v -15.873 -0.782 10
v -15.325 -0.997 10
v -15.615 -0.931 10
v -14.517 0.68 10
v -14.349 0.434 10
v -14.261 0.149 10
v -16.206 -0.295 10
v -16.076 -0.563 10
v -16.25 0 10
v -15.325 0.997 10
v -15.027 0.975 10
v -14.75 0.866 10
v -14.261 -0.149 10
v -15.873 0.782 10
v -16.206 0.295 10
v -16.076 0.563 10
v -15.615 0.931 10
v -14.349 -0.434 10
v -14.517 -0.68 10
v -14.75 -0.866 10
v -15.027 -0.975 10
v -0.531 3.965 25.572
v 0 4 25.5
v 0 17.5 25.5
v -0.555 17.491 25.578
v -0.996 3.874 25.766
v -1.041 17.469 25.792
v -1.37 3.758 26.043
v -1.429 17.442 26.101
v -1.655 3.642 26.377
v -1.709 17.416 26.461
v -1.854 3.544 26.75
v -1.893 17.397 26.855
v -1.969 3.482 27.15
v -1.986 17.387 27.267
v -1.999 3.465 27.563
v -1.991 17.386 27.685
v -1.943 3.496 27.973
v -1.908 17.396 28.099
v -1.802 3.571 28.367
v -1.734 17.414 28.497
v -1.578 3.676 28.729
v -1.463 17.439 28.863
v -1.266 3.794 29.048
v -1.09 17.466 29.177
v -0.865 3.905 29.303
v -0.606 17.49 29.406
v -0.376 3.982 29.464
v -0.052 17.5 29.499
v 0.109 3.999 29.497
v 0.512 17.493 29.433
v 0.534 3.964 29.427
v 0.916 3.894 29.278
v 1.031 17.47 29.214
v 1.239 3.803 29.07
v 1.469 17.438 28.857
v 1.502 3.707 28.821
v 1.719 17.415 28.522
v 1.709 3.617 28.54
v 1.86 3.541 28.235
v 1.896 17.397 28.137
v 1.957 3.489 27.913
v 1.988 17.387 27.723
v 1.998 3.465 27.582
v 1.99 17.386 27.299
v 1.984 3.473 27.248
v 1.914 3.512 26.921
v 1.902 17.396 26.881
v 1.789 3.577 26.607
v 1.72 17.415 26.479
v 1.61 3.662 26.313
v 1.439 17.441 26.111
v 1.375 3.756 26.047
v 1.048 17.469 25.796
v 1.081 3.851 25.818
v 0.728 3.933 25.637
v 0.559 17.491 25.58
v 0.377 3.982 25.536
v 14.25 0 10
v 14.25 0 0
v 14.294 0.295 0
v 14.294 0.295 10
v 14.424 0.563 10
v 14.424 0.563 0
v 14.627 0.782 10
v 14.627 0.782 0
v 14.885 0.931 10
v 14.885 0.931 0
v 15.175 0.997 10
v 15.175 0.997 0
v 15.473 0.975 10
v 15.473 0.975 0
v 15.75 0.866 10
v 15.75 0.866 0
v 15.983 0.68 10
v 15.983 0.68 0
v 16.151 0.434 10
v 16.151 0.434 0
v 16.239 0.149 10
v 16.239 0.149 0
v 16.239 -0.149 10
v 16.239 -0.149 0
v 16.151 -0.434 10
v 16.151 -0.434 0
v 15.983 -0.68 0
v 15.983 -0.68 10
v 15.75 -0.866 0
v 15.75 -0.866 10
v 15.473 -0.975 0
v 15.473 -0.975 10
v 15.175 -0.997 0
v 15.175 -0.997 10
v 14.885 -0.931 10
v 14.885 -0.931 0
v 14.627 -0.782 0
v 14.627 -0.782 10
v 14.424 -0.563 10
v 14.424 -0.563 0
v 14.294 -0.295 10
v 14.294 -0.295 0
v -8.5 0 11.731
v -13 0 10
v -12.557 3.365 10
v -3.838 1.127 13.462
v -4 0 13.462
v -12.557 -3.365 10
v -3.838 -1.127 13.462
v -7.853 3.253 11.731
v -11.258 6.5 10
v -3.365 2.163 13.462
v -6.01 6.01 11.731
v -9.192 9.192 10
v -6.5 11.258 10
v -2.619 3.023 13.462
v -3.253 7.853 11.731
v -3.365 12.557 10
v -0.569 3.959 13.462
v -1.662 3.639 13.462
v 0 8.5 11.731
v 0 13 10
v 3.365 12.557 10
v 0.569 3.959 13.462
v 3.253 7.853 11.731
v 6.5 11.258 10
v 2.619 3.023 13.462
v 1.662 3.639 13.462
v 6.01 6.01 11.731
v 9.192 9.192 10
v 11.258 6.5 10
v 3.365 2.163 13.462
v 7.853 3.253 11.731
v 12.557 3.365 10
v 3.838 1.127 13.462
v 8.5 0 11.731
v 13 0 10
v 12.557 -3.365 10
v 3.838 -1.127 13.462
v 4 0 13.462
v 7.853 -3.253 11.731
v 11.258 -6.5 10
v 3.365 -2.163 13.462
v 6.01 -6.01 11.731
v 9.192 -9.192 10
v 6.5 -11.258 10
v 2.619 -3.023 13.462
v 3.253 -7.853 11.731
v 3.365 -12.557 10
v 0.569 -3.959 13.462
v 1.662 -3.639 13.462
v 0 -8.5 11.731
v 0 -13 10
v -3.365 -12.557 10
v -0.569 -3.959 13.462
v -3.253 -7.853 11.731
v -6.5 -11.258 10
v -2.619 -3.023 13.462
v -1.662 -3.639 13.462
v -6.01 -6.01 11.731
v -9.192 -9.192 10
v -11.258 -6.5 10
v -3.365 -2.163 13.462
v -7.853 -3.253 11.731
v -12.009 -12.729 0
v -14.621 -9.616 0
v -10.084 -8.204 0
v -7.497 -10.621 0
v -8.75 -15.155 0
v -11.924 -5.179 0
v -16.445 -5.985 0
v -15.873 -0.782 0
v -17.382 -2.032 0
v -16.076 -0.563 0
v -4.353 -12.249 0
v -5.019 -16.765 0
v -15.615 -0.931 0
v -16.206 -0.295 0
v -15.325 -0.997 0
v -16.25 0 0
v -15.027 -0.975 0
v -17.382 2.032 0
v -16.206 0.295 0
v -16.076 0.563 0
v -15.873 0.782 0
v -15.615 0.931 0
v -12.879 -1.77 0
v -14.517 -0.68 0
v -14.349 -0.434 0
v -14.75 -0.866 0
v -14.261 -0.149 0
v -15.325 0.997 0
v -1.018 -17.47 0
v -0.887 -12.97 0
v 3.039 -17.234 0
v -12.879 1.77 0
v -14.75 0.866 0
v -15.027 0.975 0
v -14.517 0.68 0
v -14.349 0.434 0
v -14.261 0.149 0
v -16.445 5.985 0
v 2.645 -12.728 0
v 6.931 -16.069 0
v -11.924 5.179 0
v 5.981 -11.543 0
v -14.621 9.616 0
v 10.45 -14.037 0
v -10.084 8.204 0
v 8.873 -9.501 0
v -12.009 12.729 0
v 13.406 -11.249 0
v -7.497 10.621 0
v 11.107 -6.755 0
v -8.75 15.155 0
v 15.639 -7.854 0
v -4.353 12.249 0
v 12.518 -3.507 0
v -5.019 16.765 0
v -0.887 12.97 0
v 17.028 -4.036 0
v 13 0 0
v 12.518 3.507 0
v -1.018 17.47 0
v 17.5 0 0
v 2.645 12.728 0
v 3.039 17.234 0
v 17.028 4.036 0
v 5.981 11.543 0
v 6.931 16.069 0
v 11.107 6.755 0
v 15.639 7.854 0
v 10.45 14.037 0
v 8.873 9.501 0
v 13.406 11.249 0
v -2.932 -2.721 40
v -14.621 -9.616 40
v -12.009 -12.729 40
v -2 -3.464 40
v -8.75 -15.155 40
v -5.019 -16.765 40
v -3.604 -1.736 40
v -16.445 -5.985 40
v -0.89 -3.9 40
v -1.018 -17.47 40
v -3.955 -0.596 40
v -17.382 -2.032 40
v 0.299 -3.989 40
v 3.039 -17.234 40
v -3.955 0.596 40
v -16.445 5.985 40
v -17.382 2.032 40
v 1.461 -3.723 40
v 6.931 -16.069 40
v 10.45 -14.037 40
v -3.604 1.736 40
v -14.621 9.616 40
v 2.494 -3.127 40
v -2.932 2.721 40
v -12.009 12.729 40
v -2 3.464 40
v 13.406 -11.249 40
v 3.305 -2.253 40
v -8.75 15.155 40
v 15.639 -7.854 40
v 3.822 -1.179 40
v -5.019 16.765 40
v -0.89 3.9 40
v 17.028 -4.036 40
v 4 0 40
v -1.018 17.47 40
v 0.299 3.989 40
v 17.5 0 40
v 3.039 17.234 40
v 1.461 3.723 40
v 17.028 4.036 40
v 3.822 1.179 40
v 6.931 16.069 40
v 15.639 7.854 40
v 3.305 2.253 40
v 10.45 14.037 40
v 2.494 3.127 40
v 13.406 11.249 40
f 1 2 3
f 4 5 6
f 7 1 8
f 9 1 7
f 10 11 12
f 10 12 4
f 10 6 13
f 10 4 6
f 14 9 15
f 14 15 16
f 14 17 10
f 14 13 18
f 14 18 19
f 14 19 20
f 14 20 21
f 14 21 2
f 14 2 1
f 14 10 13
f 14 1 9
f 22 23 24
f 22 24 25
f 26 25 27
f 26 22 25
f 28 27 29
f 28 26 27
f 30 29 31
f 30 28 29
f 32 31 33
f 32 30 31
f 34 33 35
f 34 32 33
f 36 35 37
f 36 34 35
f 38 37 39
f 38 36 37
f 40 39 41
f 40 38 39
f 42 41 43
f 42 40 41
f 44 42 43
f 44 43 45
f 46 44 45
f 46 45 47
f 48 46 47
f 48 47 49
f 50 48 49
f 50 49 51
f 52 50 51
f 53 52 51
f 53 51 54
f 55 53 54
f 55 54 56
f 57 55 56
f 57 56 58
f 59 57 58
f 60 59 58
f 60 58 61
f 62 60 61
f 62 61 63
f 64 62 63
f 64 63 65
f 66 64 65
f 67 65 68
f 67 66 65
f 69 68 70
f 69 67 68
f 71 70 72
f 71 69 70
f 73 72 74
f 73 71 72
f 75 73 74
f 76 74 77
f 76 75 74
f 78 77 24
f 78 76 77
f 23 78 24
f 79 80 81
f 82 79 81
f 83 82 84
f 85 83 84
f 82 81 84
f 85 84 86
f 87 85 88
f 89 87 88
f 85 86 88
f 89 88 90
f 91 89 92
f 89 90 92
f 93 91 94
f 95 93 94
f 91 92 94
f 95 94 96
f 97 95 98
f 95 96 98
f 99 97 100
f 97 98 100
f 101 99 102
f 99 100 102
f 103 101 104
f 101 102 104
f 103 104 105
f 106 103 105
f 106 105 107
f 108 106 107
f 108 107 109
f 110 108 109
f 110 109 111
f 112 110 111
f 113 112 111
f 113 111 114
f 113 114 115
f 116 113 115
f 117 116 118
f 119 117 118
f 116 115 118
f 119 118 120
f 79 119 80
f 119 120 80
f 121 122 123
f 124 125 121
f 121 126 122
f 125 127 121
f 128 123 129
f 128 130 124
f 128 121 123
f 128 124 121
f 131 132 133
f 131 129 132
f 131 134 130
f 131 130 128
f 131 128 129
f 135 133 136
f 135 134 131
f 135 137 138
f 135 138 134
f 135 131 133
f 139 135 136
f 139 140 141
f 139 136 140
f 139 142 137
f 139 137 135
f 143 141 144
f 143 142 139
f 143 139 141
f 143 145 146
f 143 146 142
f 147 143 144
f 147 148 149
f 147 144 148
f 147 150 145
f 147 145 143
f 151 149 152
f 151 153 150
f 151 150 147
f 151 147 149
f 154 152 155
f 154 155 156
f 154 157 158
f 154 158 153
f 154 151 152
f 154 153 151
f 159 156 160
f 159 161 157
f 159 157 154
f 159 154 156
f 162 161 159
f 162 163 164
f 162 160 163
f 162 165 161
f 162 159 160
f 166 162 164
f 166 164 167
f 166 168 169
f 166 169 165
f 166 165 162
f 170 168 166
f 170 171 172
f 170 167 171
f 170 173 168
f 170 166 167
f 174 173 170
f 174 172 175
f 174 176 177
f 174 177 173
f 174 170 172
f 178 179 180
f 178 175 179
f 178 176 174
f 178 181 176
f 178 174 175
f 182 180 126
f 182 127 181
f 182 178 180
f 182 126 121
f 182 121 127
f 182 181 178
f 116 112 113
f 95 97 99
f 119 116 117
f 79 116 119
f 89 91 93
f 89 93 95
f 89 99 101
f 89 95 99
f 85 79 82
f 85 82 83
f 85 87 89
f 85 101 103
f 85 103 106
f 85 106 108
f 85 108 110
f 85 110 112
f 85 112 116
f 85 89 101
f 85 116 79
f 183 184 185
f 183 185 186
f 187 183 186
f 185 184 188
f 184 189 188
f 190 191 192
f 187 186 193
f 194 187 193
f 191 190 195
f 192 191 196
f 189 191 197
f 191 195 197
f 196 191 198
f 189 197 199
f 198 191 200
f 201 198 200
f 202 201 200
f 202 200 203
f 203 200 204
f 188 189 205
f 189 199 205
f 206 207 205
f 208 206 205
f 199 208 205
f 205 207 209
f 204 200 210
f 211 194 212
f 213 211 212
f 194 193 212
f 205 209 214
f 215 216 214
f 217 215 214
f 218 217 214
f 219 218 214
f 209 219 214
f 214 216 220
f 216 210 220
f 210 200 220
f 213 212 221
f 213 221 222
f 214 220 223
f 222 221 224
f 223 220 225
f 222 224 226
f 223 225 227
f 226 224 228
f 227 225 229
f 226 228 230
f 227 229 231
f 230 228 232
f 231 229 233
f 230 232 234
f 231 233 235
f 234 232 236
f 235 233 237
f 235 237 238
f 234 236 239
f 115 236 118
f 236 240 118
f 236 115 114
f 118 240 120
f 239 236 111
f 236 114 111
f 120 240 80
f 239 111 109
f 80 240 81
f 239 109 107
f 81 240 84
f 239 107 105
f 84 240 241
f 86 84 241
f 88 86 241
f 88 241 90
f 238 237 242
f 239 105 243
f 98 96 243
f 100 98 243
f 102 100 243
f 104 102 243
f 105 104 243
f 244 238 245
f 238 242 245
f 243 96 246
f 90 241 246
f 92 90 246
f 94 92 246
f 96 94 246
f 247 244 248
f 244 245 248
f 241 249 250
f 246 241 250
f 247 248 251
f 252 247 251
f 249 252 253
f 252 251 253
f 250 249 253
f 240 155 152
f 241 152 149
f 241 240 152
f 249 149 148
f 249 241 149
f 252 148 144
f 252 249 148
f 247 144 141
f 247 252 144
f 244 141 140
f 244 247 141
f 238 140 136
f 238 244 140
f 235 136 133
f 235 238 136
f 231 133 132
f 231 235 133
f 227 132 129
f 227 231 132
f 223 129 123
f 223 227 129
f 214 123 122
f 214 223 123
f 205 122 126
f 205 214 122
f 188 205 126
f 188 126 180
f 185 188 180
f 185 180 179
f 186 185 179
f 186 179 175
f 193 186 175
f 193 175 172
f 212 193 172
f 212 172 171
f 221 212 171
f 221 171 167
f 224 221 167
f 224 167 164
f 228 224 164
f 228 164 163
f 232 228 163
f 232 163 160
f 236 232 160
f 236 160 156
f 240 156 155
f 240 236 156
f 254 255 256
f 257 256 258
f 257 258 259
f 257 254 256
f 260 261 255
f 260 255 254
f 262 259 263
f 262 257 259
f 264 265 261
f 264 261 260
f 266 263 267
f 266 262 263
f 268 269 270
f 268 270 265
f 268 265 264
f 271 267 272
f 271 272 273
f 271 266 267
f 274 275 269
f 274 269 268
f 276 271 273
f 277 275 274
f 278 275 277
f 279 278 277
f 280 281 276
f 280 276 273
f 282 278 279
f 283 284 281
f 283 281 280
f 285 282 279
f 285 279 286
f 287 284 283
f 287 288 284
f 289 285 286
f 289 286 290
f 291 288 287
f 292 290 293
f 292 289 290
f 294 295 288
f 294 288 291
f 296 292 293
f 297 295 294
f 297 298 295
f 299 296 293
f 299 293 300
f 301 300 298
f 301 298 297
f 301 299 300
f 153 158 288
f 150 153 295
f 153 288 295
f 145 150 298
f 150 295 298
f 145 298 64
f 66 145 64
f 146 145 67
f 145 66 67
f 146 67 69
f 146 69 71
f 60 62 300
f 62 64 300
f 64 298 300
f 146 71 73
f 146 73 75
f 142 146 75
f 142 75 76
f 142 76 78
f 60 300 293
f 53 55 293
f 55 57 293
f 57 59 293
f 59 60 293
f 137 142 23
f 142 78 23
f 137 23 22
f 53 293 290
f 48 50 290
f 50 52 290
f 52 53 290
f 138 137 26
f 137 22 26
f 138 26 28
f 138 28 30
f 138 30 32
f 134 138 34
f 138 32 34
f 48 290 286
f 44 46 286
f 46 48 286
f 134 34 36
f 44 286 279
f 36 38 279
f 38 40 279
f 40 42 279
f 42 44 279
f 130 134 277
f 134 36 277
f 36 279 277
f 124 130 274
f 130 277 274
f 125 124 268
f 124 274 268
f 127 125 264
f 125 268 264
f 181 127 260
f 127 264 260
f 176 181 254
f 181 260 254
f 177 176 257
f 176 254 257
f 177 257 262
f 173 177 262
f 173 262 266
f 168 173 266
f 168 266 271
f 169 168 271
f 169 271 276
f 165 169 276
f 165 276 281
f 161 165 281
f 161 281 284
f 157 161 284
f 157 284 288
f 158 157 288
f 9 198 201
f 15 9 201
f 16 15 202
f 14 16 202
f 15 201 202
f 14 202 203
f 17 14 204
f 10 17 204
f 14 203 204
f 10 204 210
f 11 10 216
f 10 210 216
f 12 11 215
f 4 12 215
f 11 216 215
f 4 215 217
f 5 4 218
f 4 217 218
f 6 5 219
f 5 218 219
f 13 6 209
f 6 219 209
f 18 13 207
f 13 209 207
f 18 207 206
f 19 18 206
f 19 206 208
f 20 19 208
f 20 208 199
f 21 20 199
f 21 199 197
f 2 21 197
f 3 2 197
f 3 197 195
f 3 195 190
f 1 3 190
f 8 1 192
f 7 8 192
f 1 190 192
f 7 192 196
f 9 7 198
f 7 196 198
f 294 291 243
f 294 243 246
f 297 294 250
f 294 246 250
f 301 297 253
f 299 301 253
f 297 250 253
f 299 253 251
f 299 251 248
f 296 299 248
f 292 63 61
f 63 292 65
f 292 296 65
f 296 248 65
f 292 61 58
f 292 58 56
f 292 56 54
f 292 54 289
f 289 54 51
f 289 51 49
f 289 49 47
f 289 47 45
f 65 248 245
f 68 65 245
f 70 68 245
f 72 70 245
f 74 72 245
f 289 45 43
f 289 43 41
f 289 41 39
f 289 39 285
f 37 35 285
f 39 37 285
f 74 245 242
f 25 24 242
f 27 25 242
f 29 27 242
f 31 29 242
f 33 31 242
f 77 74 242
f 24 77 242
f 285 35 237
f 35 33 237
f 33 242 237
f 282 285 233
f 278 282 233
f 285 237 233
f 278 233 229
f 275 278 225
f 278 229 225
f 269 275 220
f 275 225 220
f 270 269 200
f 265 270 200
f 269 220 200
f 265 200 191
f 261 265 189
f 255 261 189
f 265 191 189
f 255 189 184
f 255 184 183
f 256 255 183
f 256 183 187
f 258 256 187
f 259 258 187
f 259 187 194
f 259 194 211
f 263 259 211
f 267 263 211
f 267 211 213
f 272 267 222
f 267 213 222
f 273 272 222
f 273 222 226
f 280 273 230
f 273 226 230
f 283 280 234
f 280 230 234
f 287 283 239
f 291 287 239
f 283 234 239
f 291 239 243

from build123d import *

# Parameters (mm, degrees)
CROQUIS1_R              = 17.5
CROQUIS1_R_2            = 13
SALIENTE_EXTRUIR1_DEPTH = 10
CROQUIS2_R              = 17.5
SALIENTE_EXTRUIR2_DEPTH = 30
CROQUIS12_R             = 4
CORTAR_EXTRUIR1_DEPTH   = 48.037219306
CROQUIS13_R             = 1
CORTAR_EXTRUIR2_DEPTH   = 10
CROQUIS14_R             = 2
CORTAR_EXTRUIR3_DEPTH   = 48.037219306


with BuildPart() as part:
    # Croquis1 → Saliente-Extruir1 (new body)
    with BuildSketch(Plane.XY):
        Circle(CROQUIS1_R)
        Circle(CROQUIS1_R_2, mode=Mode.SUBTRACT)
    extrude(amount=SALIENTE_EXTRUIR1_DEPTH)

    # Croquis2 → Saliente-Extruir2 (add)
    with BuildSketch(Plane.XY.offset(10)):
        Circle(CROQUIS2_R)
    extrude(amount=SALIENTE_EXTRUIR2_DEPTH)

    # Croquis4 → Cortar-Revolución1 (revolve, cut)
    with BuildSketch(Plane(origin=(0, 0, 0), x_dir=(0, 0, -1), z_dir=(1, 0, 0)), mode=Mode.PRIVATE) as cortar_revoluci_n1_sk:
        Polygon((-10, 0), (-10, 13), (-15, 0), align=None)
    revolve(cortar_revoluci_n1_sk.sketch.rotate(Axis((0, 0, 40), (0, 0, -1)), 270), axis=Axis((0, 0, 40), (0, 0, -1)), mode=Mode.SUBTRACT)

    # Croquis12 → Cortar-Extruir1 (cut, through all)
    with BuildSketch(Plane.XY.offset(40)):
        Circle(CROQUIS12_R)
    extrude(amount=-CORTAR_EXTRUIR1_DEPTH, mode=Mode.SUBTRACT)

    # Croquis13 → Cortar-Extruir2 (cut)
    with BuildSketch(Plane(origin=(0, 0, 0), x_dir=(-1, 0, 0), z_dir=(0, 0, -1))):
        with Locations((-15.25, 0)):
            Circle(CROQUIS13_R)
        with Locations((15.25, 0)):
            Circle(CROQUIS13_R)
    extrude(amount=-CORTAR_EXTRUIR2_DEPTH, mode=Mode.SUBTRACT)

    # Croquis14 → Cortar-Extruir3 (cut, through all)
    with BuildSketch(Plane(origin=(0, 0, 0), x_dir=(1, 0, 0), z_dir=(0, 1, 0))):
        with Locations(Location((0, -27.5, 0), (0, 0, 90))):
            Circle(CROQUIS14_R)
    extrude(amount=CORTAR_EXTRUIR3_DEPTH, mode=Mode.SUBTRACT)


solid = part.part
